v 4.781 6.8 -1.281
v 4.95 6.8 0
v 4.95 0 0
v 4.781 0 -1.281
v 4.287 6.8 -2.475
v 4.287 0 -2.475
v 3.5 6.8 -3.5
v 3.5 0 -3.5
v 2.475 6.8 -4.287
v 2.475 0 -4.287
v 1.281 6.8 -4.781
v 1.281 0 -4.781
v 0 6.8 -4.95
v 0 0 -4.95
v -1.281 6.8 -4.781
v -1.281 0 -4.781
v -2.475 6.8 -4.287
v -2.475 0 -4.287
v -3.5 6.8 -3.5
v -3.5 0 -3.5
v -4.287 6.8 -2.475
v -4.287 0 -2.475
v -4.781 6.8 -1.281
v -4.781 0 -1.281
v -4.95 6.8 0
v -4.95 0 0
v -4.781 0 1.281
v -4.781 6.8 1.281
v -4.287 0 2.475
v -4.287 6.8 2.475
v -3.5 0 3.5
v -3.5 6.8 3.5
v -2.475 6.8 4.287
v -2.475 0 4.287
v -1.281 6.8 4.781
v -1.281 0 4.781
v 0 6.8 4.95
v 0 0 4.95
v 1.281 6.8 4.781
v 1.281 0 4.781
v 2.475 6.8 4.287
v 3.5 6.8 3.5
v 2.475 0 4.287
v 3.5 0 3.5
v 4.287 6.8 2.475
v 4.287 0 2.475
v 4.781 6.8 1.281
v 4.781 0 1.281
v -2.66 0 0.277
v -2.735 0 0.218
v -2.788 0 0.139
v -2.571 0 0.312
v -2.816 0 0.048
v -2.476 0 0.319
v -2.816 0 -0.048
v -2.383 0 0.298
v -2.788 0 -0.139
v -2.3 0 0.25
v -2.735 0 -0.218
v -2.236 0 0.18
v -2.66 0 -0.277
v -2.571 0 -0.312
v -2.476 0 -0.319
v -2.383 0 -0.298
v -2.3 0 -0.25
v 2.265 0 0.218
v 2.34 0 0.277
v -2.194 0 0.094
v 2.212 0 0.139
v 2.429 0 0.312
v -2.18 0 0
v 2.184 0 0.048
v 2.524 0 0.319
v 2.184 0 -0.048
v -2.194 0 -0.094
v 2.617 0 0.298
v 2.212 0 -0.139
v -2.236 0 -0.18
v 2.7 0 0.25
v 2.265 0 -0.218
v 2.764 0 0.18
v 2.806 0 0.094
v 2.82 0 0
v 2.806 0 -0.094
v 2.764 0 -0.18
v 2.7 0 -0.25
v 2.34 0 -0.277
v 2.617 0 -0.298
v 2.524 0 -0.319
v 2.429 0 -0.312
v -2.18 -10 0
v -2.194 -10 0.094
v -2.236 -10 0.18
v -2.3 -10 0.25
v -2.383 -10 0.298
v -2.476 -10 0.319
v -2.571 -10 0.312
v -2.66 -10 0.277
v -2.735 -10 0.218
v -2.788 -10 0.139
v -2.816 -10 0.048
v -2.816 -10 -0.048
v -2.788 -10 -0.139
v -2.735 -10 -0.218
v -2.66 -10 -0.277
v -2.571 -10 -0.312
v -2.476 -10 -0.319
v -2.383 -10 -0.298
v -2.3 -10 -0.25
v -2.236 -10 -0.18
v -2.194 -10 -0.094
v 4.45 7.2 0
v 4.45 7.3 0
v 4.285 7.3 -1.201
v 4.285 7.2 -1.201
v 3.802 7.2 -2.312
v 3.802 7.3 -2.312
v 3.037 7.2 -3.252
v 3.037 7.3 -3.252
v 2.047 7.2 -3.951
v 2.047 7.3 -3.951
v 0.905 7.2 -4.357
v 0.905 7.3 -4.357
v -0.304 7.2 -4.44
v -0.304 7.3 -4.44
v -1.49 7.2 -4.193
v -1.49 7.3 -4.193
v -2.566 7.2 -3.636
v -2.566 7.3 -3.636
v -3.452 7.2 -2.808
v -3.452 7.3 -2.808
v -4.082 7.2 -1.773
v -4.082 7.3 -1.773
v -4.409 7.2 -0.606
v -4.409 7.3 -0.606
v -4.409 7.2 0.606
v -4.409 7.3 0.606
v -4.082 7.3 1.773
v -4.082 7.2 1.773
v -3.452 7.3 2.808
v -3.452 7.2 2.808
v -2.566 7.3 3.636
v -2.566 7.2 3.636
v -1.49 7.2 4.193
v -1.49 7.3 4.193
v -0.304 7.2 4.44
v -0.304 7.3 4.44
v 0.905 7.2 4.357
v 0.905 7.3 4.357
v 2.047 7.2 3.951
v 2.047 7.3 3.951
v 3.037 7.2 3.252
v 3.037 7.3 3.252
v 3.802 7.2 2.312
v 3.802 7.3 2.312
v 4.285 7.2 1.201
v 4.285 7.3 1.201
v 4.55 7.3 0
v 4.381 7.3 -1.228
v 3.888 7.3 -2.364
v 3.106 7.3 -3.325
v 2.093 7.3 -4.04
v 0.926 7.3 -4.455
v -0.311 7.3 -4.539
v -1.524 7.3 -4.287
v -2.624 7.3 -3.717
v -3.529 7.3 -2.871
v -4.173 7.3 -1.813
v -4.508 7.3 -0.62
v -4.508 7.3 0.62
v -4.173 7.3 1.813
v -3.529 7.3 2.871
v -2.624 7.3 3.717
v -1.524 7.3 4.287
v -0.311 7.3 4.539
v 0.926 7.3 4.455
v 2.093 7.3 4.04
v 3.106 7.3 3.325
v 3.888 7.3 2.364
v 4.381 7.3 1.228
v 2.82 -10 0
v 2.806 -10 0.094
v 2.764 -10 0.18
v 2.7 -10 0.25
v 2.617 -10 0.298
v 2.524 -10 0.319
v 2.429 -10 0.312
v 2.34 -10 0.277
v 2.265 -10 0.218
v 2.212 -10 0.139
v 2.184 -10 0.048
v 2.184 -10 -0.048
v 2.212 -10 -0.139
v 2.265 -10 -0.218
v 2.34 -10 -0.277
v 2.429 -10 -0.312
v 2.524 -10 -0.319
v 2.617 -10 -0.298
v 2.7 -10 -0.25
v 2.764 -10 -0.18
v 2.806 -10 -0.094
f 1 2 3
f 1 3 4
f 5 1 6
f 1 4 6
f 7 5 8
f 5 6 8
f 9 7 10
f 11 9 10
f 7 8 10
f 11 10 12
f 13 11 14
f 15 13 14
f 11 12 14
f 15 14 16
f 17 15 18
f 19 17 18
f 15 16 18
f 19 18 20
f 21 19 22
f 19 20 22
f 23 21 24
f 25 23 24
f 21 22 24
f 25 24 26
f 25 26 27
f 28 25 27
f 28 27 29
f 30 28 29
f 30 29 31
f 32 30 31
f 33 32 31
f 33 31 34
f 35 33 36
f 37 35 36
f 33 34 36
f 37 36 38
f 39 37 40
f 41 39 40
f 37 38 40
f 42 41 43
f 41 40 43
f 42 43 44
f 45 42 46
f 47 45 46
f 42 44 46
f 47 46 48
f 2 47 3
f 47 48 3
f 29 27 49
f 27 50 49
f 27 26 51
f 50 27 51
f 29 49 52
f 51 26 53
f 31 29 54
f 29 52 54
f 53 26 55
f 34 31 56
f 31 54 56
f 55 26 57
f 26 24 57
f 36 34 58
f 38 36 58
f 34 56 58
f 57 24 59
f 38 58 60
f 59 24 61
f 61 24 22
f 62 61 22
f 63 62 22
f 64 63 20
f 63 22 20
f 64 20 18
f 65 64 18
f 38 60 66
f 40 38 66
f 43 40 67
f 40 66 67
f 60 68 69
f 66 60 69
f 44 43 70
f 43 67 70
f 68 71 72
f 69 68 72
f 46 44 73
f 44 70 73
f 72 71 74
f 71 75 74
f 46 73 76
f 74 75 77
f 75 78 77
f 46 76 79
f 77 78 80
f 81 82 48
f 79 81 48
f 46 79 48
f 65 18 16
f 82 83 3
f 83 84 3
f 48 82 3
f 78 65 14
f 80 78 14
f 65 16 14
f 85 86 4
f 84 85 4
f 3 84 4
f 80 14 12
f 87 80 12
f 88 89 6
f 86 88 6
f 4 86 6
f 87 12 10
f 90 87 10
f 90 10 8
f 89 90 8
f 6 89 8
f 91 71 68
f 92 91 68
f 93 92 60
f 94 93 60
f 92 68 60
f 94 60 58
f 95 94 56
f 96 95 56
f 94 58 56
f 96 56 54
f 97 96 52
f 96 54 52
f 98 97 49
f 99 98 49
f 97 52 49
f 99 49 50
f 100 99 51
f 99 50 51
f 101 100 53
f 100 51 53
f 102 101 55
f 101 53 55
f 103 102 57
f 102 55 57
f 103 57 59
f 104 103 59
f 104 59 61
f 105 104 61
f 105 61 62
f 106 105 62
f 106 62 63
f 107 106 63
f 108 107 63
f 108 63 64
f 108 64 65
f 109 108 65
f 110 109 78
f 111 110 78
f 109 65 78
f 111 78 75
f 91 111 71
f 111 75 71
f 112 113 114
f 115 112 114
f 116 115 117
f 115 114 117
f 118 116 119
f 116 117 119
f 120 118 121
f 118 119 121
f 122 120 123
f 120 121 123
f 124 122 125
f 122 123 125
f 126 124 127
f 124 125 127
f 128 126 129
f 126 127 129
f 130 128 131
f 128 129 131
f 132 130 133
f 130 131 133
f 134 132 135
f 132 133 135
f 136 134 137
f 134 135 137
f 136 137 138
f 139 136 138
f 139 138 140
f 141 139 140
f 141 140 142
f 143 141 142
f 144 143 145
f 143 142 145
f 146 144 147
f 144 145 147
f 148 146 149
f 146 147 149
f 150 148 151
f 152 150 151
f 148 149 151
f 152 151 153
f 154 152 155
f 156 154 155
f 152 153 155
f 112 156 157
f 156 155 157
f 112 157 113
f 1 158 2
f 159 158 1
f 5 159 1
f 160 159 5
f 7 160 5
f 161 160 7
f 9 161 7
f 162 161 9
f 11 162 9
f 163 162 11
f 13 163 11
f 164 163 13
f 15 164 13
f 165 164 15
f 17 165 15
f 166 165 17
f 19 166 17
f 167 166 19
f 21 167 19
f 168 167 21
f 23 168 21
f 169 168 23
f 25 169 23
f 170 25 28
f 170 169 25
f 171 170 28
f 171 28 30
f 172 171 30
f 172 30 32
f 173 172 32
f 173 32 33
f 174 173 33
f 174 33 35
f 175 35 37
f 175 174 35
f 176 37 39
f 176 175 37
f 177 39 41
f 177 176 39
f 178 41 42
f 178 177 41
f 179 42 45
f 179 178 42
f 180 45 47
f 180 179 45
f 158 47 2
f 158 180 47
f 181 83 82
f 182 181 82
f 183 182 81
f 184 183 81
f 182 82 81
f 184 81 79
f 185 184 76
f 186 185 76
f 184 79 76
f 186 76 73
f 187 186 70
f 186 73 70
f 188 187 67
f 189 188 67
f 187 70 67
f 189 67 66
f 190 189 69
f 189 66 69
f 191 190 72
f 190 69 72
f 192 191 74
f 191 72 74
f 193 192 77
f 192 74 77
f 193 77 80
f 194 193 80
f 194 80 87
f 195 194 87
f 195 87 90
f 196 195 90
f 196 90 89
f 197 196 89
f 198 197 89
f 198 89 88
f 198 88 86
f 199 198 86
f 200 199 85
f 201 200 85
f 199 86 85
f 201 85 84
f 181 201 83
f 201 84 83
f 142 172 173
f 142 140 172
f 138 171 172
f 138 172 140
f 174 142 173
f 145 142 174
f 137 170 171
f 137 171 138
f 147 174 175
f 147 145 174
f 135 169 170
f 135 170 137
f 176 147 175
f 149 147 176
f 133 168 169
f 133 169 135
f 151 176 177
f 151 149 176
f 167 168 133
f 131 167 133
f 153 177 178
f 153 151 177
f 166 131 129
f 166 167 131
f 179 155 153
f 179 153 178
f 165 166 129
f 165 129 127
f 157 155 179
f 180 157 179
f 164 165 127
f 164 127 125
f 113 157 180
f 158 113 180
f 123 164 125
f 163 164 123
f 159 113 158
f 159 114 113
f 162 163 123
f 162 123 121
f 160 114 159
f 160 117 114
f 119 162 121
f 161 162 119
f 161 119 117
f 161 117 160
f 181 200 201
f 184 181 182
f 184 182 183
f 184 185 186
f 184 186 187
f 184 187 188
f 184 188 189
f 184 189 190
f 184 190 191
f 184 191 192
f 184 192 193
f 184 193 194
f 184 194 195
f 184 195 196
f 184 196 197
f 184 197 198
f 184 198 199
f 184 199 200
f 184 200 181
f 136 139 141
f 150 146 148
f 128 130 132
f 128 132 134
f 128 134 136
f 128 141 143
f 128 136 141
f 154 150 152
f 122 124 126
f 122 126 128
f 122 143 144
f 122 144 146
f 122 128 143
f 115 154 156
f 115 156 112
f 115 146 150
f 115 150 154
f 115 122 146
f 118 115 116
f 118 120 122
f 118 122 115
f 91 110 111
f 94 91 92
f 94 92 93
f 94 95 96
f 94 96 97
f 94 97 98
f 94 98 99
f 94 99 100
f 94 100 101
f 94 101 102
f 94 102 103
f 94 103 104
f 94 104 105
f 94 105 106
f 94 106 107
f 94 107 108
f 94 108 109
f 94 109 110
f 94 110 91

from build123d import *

# Parameters (mm, degrees)
SKETCH1_R           = 4.95
BOSS_EXTRUDE1_DEPTH = 7.3
CHAMFER1_SIZE       = 0.5
CHAMFER1_SIZE2      = 0.4
SKETCH2_R           = 0.32
BOSS_EXTRUDE2_DEPTH = 10
SKETCH3_R           = 4.45
CUT_EXTRUDE1_DEPTH  = 0.1


with BuildPart() as part:
    # Sketch1 → Boss-Extrude1 (new body)
    with BuildSketch(Plane(origin=(0, 0, 0), x_dir=(1, 0, 0), z_dir=(0, 1, 0))):
        Circle(SKETCH1_R)
    extrude(amount=BOSS_EXTRUDE1_DEPTH)

    # Chamfer1
    chamfer1_edges = [part.edges().sort_by_distance(p)[0] for p in [
        (-4.95, 7.3, 0),
    ]]
    chamfer1_side = [part.faces().sort_by_distance(p)[0] for p in [
        (-4.95, 3.65, 0),
    ]]
    chamfer(chamfer1_edges, length=CHAMFER1_SIZE, length2=CHAMFER1_SIZE2, reference=chamfer1_side[0])

    # Sketch2 → Boss-Extrude2 (add)
    with BuildSketch(Plane.XZ):
        with Locations((-2.5, 0)):
            Circle(SKETCH2_R)
        with Locations((2.5, 0)):
            Circle(SKETCH2_R)
    extrude(amount=BOSS_EXTRUDE2_DEPTH)

    # Sketch3 → Cut-Extrude1 (cut)
    with BuildSketch(Plane(origin=(0, 7.3, 0), x_dir=(1, 0, 0), z_dir=(0, 1, 0))):
        Circle(SKETCH3_R)
    extrude(amount=-CUT_EXTRUDE1_DEPTH, mode=Mode.SUBTRACT)


solid = part.part
